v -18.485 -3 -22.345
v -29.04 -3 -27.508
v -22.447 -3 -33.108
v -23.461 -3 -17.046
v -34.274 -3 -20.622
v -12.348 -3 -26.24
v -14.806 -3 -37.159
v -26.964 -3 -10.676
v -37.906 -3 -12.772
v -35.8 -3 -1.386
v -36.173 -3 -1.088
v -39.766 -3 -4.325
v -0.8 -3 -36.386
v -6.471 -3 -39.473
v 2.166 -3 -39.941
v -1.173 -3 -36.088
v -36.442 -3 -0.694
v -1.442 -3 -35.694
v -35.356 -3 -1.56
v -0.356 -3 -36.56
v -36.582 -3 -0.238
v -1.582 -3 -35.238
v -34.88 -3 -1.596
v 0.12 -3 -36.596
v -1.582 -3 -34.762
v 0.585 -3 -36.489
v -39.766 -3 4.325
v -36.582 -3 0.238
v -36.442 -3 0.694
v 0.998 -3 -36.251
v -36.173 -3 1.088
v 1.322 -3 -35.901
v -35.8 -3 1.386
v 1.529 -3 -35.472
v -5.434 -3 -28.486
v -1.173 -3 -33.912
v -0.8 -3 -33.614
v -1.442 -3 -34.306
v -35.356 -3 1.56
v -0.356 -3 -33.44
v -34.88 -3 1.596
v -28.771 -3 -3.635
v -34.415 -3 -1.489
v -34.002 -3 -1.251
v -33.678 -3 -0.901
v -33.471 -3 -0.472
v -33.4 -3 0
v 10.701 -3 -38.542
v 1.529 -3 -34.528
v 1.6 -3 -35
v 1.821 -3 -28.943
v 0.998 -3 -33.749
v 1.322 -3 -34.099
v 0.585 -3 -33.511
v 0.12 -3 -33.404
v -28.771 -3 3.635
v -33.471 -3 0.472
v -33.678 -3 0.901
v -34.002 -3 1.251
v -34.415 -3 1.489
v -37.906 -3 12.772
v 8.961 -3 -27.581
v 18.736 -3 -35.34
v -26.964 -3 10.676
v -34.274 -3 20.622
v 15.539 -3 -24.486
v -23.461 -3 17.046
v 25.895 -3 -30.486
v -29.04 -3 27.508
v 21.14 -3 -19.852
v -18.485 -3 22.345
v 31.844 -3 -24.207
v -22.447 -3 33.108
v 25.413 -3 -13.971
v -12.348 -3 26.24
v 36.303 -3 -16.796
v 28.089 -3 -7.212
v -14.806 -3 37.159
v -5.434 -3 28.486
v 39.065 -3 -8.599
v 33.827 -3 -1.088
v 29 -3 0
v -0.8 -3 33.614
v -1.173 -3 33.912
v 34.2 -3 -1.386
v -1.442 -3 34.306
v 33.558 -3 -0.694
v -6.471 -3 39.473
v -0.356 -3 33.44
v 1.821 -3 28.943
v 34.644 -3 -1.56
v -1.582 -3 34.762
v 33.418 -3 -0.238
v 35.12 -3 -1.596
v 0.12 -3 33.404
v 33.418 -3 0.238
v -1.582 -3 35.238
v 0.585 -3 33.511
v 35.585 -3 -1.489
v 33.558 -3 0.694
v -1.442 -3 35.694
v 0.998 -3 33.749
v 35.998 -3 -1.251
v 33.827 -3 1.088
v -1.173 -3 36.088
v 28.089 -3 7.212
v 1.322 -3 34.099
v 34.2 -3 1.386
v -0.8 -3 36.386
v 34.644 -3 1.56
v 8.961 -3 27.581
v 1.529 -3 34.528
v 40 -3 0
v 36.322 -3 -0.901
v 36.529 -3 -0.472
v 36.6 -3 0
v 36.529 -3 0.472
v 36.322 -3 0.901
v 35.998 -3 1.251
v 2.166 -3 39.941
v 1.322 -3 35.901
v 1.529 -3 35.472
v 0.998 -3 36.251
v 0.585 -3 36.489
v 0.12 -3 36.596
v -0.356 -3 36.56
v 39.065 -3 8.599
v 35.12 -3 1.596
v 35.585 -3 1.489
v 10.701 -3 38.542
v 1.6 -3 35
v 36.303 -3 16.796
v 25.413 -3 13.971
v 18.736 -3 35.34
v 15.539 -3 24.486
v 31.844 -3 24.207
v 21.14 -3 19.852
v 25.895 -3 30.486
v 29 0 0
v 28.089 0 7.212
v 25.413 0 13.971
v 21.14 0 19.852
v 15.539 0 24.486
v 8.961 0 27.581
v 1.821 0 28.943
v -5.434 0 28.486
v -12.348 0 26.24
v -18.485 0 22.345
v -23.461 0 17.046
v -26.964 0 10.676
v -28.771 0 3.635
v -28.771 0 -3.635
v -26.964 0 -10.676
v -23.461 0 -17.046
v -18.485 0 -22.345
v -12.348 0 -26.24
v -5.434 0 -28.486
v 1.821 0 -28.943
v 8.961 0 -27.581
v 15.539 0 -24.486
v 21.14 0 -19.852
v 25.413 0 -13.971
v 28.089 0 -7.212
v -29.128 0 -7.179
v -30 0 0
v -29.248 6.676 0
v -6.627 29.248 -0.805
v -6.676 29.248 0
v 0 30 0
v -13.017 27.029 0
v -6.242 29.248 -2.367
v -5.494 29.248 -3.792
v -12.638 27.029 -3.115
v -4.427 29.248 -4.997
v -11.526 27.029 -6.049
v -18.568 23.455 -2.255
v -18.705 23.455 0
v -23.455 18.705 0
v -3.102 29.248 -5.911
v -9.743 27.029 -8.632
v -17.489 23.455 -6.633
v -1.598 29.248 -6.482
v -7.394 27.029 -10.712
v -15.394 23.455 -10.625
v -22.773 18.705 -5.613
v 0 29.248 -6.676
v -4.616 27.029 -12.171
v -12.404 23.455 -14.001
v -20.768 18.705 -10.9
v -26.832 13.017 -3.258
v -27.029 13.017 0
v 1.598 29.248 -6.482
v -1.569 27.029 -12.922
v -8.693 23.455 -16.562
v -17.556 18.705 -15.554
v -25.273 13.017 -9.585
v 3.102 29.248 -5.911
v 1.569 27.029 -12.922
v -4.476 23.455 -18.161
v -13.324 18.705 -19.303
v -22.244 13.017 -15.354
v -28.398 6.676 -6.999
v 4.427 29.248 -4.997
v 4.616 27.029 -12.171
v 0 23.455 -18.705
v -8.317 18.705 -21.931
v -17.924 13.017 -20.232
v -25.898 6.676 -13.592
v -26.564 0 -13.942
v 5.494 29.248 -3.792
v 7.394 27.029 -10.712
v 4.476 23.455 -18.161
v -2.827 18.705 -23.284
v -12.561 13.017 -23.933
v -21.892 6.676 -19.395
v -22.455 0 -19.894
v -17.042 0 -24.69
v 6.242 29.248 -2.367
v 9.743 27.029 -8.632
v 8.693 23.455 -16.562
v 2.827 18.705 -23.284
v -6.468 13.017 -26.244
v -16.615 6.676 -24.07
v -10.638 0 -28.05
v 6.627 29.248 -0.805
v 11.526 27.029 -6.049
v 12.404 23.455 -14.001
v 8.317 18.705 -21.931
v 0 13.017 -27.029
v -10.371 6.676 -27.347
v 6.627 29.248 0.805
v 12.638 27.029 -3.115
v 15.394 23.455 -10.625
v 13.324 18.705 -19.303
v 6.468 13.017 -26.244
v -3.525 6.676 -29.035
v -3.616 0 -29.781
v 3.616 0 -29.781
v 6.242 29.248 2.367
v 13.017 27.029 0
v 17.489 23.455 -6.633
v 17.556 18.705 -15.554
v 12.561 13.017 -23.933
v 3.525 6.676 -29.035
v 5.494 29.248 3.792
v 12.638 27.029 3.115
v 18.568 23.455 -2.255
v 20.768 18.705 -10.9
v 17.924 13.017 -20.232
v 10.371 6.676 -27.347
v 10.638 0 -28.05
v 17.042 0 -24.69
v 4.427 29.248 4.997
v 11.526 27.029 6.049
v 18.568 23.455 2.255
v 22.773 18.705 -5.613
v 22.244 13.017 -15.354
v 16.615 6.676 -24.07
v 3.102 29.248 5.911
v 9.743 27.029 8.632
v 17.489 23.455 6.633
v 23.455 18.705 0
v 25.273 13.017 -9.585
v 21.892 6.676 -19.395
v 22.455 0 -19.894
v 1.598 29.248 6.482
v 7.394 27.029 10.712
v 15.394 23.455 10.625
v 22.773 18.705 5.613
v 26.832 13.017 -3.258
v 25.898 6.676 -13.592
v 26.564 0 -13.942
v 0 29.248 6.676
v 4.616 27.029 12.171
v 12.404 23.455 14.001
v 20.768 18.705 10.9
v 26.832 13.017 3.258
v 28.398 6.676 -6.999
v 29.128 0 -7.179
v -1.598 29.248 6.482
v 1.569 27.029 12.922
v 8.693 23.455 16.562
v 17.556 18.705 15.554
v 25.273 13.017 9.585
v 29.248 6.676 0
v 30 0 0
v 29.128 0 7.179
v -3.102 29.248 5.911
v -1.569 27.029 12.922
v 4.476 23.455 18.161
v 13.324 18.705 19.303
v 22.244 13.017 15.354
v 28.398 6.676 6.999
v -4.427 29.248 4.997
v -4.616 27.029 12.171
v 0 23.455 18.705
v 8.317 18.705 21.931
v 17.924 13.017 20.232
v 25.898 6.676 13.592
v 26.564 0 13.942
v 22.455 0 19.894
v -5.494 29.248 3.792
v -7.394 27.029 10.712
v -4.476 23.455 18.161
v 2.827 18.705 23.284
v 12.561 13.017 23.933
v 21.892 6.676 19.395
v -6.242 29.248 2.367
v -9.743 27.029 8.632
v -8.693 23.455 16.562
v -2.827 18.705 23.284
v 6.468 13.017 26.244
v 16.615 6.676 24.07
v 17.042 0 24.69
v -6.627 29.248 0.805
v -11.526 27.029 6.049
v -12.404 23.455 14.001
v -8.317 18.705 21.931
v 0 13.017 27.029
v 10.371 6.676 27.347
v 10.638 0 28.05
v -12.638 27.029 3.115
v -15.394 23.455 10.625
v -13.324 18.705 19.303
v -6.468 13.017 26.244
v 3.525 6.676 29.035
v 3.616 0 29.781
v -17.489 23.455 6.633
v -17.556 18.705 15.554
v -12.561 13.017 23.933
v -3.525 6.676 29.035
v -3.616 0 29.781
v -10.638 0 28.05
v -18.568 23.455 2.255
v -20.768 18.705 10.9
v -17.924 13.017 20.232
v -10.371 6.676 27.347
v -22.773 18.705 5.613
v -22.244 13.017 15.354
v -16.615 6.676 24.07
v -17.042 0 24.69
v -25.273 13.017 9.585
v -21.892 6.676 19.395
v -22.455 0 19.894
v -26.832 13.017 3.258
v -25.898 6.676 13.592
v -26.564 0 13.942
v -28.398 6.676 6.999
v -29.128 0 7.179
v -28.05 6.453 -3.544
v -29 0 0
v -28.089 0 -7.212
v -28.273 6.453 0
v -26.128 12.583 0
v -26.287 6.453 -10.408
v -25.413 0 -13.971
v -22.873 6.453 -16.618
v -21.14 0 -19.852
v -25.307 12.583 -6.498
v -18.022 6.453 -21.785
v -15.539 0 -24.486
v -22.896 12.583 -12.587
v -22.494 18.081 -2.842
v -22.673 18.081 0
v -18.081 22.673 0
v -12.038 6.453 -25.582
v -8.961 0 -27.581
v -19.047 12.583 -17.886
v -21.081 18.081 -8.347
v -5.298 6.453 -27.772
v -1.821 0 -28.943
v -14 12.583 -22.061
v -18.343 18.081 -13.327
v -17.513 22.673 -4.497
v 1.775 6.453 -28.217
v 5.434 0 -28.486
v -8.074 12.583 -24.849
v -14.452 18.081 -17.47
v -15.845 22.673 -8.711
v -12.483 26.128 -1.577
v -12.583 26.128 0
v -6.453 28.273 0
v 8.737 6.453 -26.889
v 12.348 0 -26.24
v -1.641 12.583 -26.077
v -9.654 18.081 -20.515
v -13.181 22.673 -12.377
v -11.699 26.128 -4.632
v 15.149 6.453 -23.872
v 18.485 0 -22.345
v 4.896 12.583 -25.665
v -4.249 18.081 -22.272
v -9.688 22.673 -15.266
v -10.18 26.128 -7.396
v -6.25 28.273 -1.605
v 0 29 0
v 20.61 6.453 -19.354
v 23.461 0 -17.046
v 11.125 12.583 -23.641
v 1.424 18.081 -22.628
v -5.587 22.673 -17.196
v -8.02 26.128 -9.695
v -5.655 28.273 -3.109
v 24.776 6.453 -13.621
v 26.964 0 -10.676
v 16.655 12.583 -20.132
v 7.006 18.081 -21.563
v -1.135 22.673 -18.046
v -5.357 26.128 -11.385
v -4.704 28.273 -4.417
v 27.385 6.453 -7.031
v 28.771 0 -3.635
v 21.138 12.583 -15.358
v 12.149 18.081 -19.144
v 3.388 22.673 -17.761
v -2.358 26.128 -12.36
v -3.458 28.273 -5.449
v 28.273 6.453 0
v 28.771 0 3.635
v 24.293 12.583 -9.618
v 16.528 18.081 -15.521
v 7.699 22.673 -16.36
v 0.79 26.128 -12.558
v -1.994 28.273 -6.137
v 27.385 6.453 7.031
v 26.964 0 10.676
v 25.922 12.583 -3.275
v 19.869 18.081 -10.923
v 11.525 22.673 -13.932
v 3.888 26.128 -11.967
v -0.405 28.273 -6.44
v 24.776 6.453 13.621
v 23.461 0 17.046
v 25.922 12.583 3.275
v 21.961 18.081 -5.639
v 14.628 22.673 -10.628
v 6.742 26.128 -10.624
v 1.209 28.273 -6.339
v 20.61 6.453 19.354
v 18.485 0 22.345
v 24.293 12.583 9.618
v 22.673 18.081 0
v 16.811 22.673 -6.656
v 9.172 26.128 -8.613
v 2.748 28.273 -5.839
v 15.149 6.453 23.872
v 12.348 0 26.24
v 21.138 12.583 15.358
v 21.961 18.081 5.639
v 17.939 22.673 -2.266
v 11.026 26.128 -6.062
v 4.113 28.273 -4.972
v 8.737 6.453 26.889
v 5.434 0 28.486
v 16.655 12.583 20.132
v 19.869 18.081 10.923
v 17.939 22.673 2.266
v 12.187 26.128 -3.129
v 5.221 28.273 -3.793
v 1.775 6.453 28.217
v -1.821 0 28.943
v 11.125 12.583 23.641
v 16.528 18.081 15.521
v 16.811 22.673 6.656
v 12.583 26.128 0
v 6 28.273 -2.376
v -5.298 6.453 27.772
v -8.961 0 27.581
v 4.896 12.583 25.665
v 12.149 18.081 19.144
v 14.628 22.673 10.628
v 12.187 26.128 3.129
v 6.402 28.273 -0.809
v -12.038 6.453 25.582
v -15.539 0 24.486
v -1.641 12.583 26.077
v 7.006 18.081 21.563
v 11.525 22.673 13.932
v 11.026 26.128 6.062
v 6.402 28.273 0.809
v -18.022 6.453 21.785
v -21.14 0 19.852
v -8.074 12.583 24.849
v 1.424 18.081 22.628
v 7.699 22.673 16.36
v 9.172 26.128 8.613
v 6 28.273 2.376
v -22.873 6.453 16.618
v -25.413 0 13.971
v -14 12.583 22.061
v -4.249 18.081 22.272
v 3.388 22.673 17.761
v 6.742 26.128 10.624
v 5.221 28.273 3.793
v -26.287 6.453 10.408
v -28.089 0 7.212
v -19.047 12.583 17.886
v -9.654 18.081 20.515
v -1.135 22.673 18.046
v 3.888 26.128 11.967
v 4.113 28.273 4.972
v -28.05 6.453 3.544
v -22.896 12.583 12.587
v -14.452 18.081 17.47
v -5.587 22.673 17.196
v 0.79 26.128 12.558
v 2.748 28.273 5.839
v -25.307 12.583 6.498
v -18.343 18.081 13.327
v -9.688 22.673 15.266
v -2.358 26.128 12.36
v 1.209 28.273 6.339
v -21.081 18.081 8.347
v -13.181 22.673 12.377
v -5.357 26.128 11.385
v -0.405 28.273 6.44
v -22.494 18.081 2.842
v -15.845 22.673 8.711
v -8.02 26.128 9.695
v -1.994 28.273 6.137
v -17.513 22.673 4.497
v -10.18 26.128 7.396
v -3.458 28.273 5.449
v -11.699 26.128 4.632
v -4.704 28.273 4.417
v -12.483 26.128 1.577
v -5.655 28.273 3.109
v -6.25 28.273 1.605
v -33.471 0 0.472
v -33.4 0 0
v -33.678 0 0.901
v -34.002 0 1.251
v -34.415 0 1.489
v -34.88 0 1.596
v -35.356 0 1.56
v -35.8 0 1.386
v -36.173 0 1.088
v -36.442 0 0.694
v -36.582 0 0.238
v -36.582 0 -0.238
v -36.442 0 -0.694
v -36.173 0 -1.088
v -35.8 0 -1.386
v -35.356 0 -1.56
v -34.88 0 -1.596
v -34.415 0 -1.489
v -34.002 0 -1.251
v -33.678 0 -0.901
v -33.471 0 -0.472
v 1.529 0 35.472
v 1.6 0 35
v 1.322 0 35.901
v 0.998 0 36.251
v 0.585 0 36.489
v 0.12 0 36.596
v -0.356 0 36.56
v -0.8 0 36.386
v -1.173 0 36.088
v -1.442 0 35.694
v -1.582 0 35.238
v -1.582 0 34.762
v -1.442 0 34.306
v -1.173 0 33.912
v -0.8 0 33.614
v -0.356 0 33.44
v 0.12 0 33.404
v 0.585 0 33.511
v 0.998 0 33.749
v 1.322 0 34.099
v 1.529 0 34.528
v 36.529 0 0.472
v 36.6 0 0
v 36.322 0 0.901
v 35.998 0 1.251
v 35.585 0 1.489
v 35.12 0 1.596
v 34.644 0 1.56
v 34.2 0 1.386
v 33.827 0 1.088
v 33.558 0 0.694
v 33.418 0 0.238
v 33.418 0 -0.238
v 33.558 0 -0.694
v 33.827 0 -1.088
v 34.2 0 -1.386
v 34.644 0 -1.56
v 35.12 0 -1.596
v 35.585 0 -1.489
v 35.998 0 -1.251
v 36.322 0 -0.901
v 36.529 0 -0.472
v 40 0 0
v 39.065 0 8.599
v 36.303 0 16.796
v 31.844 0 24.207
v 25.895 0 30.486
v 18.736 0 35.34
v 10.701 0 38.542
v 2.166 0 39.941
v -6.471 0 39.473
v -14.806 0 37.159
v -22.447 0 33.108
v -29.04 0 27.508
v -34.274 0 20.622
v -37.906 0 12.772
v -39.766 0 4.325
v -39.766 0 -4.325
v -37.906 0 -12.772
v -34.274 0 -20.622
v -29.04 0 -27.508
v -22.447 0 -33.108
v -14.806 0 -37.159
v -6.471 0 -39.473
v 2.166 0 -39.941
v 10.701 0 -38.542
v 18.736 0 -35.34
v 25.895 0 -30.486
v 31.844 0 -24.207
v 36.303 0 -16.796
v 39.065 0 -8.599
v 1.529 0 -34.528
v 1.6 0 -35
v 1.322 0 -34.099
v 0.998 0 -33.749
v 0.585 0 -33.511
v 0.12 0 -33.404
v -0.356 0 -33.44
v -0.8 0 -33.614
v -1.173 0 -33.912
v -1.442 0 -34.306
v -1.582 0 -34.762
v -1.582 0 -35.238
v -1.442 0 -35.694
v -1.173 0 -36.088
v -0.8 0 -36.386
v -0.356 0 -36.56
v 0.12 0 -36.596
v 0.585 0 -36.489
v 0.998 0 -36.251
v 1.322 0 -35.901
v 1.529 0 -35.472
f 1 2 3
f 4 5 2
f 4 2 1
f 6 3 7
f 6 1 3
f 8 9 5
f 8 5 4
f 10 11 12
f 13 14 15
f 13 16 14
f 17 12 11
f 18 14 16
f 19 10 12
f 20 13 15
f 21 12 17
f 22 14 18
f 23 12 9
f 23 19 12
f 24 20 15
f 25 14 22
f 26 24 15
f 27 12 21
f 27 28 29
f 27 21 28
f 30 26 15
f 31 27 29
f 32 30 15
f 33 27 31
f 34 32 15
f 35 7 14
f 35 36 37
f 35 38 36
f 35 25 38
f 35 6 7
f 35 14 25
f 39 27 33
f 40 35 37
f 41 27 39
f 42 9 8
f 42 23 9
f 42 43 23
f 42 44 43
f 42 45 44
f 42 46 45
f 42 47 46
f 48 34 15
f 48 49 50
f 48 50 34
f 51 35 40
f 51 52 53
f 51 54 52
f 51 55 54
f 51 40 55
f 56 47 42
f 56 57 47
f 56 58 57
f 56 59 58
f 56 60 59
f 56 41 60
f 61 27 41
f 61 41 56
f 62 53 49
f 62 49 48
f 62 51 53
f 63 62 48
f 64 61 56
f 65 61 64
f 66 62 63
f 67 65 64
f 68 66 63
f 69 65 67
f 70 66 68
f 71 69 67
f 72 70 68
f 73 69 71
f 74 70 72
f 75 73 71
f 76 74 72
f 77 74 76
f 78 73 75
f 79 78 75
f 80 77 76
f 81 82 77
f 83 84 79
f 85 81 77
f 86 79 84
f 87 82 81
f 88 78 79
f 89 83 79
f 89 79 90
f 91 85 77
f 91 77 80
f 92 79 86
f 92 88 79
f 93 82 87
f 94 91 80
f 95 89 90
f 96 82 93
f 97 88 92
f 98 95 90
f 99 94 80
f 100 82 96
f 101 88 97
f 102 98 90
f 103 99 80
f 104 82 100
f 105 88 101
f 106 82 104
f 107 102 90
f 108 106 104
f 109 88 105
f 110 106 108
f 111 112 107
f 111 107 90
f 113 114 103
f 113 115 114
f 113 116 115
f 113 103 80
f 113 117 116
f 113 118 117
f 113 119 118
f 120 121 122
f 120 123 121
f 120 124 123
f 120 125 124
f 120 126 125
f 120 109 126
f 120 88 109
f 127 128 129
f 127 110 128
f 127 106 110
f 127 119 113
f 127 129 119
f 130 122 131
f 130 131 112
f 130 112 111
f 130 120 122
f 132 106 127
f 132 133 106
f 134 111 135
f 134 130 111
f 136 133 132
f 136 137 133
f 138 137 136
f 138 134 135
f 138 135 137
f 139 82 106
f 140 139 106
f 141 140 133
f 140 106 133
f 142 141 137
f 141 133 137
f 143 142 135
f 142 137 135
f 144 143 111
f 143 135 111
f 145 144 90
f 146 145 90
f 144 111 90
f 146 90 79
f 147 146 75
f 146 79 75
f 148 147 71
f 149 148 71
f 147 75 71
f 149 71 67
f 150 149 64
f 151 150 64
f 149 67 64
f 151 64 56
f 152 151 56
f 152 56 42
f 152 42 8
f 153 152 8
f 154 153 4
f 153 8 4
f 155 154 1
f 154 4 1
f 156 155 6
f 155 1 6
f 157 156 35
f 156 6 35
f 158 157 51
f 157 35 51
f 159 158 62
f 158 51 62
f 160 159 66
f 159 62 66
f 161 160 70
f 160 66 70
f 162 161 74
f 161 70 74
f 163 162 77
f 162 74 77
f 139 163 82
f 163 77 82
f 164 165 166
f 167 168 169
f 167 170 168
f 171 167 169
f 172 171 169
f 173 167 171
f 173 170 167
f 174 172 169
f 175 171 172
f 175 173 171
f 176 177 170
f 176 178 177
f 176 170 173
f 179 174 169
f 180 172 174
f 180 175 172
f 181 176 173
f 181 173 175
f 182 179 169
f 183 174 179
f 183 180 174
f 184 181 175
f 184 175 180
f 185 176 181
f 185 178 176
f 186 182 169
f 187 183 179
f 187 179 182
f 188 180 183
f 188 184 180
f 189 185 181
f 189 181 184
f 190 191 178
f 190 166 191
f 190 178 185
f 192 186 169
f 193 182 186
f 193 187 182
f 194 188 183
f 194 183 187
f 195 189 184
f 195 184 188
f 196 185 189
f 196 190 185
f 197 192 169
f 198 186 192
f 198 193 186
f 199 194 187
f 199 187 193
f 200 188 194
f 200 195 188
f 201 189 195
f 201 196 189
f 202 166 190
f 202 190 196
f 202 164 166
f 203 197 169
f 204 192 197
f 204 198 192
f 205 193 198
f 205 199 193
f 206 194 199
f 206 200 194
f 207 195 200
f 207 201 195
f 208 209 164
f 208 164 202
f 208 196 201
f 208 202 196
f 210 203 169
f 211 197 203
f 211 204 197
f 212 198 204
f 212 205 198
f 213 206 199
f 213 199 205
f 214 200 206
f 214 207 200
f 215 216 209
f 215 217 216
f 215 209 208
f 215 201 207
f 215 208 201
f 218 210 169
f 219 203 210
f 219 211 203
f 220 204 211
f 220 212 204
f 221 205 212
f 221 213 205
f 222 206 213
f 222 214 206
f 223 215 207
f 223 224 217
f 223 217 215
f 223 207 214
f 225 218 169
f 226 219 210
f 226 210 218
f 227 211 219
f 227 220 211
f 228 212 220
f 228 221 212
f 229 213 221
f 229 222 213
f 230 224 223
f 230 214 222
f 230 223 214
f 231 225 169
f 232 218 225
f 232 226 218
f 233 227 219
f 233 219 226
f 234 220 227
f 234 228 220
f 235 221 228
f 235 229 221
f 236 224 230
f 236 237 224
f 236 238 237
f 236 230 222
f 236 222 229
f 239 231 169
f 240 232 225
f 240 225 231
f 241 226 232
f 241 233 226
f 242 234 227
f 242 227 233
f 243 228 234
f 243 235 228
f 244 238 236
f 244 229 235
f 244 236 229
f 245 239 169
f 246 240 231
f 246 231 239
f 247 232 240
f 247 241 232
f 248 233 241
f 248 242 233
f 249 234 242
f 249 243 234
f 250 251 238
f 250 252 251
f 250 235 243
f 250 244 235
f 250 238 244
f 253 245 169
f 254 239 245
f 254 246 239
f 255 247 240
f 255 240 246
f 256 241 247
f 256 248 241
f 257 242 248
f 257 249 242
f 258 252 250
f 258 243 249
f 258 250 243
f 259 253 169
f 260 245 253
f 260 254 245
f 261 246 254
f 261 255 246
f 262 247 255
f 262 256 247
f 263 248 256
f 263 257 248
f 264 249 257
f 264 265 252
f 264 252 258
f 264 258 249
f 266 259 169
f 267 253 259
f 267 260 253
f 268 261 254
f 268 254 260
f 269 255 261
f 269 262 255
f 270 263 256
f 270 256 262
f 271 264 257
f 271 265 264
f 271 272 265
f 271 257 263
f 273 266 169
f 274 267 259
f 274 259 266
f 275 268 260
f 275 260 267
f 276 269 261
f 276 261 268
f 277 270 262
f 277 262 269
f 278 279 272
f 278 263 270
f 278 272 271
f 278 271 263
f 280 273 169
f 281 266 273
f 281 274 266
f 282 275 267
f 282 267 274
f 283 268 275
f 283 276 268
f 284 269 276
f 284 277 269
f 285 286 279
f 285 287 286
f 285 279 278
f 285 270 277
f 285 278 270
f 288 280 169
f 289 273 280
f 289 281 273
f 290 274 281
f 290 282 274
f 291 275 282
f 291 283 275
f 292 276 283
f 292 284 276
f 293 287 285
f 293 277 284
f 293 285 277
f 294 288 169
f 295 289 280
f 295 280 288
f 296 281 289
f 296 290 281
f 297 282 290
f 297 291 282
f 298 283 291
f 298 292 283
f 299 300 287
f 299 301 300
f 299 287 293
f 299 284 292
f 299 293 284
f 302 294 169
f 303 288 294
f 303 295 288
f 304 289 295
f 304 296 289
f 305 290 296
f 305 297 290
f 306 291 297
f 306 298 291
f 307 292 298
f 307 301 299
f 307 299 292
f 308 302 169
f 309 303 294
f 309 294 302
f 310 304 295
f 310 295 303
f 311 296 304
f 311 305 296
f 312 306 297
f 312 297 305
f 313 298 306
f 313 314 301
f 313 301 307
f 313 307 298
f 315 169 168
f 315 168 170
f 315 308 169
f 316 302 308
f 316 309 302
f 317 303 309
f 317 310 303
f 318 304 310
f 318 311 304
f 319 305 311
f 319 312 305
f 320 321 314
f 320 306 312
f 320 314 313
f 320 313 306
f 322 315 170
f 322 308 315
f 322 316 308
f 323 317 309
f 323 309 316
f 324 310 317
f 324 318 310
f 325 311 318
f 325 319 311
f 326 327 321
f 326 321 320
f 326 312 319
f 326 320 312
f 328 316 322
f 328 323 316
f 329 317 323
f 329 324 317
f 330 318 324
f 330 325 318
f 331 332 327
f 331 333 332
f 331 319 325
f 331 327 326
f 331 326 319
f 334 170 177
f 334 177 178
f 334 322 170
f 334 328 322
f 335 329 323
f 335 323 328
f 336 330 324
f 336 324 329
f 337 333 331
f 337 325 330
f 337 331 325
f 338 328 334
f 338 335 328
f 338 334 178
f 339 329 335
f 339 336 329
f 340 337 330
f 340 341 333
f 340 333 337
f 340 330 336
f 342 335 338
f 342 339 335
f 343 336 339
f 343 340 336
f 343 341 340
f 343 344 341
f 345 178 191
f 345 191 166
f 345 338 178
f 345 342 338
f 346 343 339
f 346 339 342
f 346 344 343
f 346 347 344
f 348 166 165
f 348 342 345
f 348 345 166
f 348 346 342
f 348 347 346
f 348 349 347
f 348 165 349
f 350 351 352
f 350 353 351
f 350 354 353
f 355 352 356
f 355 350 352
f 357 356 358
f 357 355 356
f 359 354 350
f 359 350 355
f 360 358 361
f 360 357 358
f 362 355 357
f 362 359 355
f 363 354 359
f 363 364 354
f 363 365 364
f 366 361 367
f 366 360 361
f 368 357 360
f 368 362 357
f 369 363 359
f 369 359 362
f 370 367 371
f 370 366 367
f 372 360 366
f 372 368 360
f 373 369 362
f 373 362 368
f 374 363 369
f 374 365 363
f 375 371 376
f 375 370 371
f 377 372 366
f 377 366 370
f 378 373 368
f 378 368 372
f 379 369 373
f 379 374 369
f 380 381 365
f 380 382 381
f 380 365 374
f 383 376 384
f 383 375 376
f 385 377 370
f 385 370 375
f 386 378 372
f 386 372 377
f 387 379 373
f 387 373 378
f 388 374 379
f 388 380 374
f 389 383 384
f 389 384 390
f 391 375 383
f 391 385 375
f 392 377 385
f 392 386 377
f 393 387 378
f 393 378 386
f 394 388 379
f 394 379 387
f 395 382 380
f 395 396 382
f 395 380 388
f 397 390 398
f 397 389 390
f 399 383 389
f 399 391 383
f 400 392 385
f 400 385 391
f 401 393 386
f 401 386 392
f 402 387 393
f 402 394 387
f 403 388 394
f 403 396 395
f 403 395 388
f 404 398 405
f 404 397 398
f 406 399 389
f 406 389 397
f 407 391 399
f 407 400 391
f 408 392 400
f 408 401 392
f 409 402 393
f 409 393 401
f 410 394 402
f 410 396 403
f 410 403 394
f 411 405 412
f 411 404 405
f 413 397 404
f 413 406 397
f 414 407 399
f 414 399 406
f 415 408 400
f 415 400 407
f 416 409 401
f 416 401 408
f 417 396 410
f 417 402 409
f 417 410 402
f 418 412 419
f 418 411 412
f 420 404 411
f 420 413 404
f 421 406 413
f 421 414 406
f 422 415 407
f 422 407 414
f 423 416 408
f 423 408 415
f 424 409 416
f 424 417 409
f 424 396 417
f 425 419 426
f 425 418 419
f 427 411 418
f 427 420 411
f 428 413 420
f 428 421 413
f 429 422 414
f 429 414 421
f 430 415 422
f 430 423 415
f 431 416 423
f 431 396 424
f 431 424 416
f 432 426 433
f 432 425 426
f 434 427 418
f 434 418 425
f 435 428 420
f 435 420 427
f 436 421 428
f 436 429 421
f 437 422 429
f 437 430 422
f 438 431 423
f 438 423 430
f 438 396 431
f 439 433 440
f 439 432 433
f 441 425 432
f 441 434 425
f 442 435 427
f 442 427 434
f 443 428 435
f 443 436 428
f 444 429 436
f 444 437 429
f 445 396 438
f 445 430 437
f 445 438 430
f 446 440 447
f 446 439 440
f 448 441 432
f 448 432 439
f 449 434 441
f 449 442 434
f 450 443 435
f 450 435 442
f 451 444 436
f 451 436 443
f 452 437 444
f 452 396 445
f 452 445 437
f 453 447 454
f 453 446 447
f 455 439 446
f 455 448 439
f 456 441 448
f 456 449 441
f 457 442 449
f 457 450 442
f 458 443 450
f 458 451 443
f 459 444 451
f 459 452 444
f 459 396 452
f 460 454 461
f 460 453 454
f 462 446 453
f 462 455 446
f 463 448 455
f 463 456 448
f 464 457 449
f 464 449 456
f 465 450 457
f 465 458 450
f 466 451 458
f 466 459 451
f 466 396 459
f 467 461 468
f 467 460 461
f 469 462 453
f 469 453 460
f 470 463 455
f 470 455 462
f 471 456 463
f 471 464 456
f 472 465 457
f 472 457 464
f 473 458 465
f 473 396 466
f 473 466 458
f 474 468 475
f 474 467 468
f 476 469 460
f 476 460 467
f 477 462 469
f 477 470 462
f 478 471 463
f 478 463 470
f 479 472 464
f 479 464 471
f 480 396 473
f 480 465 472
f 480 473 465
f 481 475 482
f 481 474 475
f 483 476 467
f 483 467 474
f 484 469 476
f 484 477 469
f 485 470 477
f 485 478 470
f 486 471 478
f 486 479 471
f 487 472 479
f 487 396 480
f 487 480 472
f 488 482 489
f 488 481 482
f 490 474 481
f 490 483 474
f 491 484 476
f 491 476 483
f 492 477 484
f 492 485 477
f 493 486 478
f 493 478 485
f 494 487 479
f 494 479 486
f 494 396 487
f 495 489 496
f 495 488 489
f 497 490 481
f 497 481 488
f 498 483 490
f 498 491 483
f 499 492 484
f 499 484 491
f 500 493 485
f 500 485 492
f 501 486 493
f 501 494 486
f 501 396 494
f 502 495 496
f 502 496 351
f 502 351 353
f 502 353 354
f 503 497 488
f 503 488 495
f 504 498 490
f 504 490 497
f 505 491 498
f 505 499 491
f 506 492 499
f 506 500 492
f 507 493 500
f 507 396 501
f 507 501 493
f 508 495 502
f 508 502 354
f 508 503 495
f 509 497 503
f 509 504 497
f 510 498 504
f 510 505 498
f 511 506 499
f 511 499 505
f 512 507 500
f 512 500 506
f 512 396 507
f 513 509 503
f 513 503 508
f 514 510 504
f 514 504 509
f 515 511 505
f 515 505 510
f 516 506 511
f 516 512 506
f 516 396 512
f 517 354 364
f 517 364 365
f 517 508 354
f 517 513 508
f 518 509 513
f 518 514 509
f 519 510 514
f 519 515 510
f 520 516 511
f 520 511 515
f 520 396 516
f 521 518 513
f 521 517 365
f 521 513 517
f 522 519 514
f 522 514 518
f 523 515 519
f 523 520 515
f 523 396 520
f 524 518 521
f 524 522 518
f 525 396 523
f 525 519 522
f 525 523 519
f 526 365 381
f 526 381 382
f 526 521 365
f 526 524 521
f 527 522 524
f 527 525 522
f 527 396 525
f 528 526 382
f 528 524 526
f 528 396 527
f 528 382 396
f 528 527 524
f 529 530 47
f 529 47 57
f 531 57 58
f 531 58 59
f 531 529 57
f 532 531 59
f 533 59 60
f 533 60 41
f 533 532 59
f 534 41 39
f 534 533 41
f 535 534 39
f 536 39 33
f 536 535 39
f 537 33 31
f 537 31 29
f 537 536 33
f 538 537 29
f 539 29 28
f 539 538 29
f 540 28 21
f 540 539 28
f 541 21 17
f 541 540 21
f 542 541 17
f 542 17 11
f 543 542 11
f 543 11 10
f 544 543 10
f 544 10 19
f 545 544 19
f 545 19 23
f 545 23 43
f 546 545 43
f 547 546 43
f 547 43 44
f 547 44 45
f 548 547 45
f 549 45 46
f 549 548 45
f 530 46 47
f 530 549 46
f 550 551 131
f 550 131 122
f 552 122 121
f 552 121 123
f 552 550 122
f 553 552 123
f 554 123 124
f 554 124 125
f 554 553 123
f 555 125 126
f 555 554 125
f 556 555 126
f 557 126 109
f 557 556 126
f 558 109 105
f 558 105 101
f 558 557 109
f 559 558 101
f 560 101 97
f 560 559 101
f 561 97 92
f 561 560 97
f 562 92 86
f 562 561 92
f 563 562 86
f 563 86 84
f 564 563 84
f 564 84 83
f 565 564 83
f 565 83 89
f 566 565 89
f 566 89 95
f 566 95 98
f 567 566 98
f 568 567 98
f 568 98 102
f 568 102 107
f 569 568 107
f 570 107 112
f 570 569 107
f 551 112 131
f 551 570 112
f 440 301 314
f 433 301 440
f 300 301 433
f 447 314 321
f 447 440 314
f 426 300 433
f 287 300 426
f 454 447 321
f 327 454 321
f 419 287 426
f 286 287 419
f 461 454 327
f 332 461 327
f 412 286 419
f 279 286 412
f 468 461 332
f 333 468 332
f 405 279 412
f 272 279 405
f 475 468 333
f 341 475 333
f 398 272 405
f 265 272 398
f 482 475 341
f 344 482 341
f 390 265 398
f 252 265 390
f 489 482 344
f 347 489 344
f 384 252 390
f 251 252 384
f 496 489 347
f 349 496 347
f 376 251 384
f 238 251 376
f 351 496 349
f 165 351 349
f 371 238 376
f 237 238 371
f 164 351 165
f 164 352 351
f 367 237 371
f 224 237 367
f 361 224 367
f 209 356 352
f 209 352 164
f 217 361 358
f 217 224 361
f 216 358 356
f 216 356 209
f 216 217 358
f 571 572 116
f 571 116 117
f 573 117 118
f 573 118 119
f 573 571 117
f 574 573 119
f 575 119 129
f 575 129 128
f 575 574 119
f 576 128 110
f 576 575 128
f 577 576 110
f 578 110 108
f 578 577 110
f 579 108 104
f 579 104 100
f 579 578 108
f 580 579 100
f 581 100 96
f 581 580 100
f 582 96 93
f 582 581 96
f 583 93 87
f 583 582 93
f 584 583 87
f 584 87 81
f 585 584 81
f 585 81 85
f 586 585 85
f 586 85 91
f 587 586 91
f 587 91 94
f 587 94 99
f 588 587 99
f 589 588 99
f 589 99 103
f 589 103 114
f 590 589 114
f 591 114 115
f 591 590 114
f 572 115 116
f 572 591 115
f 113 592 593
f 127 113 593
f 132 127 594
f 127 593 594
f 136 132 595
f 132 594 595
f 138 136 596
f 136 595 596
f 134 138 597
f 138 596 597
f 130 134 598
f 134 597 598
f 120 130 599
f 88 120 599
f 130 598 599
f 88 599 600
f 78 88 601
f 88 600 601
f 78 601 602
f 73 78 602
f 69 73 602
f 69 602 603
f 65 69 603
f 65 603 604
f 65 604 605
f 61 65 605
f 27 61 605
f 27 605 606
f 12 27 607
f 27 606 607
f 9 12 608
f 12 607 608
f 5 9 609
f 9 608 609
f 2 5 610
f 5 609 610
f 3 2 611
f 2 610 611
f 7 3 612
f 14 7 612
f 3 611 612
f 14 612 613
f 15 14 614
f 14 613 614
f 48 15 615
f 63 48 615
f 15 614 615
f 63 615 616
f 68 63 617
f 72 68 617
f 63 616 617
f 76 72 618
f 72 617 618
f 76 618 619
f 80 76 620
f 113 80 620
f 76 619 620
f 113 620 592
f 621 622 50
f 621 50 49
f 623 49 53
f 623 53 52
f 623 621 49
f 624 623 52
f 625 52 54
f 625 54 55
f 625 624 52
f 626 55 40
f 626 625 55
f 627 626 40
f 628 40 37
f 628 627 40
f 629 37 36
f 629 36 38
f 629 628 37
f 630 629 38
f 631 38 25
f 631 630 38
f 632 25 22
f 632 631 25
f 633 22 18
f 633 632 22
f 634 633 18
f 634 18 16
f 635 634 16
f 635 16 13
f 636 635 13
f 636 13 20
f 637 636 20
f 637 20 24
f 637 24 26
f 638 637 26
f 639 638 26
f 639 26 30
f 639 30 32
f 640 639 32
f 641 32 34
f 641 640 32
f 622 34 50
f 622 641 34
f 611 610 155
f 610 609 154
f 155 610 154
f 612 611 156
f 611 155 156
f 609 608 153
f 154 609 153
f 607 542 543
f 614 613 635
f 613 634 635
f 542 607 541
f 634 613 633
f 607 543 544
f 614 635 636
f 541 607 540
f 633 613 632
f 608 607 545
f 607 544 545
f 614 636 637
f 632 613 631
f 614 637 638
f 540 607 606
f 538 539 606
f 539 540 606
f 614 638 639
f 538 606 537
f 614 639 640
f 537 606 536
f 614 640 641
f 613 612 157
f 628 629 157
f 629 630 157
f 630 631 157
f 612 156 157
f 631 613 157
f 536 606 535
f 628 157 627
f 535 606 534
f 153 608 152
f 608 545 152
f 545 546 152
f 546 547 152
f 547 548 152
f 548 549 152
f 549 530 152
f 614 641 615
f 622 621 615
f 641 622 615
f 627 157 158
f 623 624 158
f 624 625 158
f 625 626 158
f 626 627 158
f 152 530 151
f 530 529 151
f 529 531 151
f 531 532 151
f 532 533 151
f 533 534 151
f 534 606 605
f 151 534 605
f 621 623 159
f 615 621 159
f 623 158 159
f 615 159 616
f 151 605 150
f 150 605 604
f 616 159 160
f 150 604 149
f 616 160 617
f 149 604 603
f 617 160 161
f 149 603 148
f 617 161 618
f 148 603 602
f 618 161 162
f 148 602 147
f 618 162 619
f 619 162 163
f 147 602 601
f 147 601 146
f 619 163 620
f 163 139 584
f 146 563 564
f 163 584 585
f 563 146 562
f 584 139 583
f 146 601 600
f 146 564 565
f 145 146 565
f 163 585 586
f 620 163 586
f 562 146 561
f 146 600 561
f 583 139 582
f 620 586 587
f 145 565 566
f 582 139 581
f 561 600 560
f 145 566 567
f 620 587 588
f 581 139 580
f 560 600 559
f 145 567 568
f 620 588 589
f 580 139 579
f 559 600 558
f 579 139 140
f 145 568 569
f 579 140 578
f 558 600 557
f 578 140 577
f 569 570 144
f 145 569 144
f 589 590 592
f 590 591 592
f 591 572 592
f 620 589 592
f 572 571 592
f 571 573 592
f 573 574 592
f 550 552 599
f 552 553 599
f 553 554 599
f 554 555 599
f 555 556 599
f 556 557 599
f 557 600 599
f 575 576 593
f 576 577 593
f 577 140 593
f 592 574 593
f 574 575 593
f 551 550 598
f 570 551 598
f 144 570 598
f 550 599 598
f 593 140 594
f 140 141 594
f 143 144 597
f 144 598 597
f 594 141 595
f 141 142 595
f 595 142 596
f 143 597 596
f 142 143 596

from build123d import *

# Parameters (mm, degrees)
SKETCH_2_R          = 40
SKETCH_2_R_2        = 28.5
SKETCH_2_R_3        = 1.6
EXTRUDE_1_DEPTH     = 3
SKETCH_3_R          = 29
CUT_EXTRUDE_1_DEPTH = 3


with BuildPart() as part:
    # 草图1 → 旋转1 (revolve)
    with BuildSketch(Plane.XY):
        with BuildLine():
            Line((-30, 0), (-29, 0))
            ThreePointArc((-29, 0), (-20.506096654, 20.506096654), (0, 29))
            Line((0, 29), (0, 30))
            ThreePointArc((0, 30), (-21.213203436, 21.213203436), (-30, 0))
        make_face()
    revolve(axis=Axis((0, 29, 0), (0, -1, 0)))


with BuildPart() as body_2:
    # 草图2 → 凸台-拉伸1 (new body)
    with BuildSketch(Plane.XZ):
        Circle(SKETCH_2_R)
        Circle(SKETCH_2_R_2, mode=Mode.SUBTRACT)
        with Locations((0, 35)):
            Circle(SKETCH_2_R_3, mode=Mode.SUBTRACT)
        with Locations((35, 0)):
            Circle(SKETCH_2_R_3, mode=Mode.SUBTRACT)
        with Locations((0, -35)):
            Circle(SKETCH_2_R_3, mode=Mode.SUBTRACT)
        with Locations((-35, 0)):
            Circle(SKETCH_2_R_3, mode=Mode.SUBTRACT)
    extrude(amount=EXTRUDE_1_DEPTH)

    # 草图3 → 切除-拉伸1 (cut)
    with BuildSketch(Plane.XZ.offset(3)):
        Circle(SKETCH_3_R)
    extrude(amount=-CUT_EXTRUDE_1_DEPTH, mode=Mode.SUBTRACT)


solid = Compound([part.part, body_2.part])
